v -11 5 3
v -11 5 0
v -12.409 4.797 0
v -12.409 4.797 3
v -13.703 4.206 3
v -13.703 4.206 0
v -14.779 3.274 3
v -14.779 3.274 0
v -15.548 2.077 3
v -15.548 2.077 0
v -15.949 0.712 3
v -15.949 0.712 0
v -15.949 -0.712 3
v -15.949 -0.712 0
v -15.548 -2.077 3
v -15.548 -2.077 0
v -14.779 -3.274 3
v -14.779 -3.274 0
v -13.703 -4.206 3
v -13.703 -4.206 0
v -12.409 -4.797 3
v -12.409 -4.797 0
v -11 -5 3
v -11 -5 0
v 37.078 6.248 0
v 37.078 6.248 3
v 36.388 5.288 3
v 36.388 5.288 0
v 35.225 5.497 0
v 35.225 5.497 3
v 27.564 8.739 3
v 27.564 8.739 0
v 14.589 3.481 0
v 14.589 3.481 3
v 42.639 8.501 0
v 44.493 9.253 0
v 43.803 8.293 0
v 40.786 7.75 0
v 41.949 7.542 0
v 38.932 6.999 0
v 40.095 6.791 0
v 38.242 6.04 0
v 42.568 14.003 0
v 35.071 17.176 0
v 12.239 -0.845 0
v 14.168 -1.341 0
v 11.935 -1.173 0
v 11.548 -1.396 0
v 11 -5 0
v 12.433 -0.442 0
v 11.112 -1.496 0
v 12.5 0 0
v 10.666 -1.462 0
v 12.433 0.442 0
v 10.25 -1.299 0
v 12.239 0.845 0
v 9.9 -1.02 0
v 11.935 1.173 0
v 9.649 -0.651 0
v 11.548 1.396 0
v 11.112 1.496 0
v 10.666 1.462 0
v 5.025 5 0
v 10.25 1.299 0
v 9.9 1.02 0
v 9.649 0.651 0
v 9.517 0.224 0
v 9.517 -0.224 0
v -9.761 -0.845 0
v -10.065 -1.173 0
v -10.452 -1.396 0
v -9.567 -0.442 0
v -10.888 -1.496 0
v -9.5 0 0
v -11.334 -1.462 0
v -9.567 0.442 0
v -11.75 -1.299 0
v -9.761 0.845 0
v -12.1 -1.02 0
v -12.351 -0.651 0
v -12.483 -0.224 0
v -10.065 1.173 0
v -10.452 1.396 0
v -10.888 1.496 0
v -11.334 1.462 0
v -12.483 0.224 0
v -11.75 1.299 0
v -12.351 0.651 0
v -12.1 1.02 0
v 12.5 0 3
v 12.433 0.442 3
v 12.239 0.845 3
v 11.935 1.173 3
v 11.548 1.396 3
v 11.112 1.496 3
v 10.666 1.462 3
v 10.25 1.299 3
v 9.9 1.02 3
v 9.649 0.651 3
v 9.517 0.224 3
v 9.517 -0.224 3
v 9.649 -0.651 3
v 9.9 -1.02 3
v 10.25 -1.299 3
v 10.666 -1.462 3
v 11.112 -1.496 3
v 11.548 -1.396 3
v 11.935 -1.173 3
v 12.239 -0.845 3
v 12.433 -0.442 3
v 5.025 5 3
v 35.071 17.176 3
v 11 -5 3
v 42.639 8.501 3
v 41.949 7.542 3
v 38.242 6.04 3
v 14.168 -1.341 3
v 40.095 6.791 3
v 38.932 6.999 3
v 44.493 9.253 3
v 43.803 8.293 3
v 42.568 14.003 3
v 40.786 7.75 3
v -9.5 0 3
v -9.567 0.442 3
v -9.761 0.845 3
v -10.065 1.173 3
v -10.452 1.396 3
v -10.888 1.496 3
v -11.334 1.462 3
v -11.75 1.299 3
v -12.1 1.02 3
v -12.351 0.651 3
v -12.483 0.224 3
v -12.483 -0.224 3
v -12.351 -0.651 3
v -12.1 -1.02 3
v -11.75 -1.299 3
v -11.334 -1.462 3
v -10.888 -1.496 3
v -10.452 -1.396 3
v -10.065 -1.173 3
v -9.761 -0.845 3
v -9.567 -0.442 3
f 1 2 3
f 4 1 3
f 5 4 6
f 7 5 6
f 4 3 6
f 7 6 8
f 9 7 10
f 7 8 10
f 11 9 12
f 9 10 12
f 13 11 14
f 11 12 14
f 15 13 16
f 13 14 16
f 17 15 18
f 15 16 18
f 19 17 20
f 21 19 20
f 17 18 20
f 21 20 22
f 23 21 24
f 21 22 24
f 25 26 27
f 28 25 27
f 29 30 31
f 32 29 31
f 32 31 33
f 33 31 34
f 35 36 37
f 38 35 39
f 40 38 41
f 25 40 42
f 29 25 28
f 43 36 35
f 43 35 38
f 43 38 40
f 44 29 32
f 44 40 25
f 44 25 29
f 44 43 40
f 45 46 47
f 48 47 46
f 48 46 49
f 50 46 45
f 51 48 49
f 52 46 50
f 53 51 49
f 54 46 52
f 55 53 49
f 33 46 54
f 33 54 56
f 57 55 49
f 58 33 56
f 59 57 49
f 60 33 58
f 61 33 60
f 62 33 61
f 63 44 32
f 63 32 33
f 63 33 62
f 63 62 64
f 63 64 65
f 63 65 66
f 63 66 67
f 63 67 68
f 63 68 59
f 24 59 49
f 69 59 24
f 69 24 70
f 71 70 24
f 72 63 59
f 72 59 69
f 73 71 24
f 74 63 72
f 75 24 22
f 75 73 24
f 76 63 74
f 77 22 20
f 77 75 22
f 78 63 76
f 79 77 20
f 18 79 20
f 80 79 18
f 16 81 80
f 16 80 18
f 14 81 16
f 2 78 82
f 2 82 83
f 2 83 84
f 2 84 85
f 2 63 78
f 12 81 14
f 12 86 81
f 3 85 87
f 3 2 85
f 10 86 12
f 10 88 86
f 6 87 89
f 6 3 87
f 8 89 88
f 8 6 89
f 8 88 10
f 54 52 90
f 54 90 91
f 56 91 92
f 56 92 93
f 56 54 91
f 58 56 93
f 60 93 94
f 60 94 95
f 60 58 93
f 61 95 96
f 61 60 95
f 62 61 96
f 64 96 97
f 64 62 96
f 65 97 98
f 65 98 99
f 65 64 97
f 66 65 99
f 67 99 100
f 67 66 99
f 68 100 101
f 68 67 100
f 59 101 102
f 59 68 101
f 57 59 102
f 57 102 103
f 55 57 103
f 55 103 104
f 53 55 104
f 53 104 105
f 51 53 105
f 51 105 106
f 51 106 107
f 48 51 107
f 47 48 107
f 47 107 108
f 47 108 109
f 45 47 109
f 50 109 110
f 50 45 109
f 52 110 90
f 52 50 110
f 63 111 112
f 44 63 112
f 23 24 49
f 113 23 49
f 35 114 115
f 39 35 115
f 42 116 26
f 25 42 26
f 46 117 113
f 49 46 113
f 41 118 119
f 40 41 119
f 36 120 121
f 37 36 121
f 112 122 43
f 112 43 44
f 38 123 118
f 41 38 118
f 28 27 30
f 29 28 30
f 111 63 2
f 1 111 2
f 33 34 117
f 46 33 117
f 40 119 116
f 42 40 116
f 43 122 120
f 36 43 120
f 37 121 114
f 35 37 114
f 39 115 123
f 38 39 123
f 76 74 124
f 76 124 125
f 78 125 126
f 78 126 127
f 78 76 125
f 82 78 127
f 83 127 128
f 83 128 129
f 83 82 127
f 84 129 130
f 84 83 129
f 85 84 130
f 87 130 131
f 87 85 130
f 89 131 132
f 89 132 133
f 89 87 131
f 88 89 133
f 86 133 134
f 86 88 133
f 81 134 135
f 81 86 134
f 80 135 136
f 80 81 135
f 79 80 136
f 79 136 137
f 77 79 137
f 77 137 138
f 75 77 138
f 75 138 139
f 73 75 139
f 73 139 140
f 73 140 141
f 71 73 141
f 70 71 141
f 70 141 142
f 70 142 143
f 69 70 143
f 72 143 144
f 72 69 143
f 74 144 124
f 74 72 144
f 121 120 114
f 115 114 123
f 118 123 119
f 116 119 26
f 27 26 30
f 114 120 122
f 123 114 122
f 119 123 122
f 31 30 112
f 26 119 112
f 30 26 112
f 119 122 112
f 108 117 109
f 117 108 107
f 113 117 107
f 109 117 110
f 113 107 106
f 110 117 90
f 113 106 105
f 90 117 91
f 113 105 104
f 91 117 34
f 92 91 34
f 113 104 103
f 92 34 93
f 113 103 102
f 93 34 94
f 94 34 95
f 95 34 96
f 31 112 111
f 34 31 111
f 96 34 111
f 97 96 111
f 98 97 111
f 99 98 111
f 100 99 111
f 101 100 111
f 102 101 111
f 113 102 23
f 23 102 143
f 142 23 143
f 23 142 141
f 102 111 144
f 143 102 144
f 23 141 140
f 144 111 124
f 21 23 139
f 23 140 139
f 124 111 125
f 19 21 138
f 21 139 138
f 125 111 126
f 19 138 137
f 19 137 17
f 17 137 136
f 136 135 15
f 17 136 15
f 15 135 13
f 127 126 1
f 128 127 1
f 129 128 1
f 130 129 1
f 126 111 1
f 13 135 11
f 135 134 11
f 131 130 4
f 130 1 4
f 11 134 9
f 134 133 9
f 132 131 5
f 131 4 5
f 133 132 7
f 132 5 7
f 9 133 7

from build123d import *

# Parameters (mm, degrees)
SKETCH2_R               = 1.5
BOSS_EXTRUDE1_DEPTH     = 3
BOSS_EXTRUDE2_DEPTH     = 3
CUT_EXTRUDE1_DEPTH      = 3
CUT_EXTRUDE2_DEPTH      = 1
CUT_EXTRUDE2_DEPTH_BACK = 4


with BuildPart() as part:
    # Sketch2 → Boss-Extrude1 (new body)
    with BuildSketch(Plane.XY):
        with BuildLine():
            Line((11, 5), (-11, 5))
            ThreePointArc((-11, 5), (-16, 0), (-11, -5))
            Line((-11, -5), (11, -5))
            ThreePointArc((11, -5), (16, 0), (11, 5))
        make_face()
        with Locations((-11, 0)):
            Circle(SKETCH2_R, mode=Mode.SUBTRACT)
        with Locations((11, 0)):
            Circle(SKETCH2_R, mode=Mode.SUBTRACT)
    extrude(amount=BOSS_EXTRUDE1_DEPTH)

    # Sketch3 → Boss-Extrude2 (add)
    with BuildSketch(Plane.XY.offset(3)):
        with BuildLine():
            Line((44.729340863, 8.668642725), (35.461430272, 4.9128694))
            Line((35.461430272, 4.9128694), (35.224816552, 5.496747767))
            Line((35.224816552, 5.496747767), (27.564491501, 8.738899793))
            Line((27.564491501, 8.738899793), (14.589416673, 3.480817138))
            ThreePointArc((14.589416673, 3.480817138), (12.94883482, 4.604567607), (11, 5))
            Line((11, 5), (5.025381266, 5))
            Line((5.025381266, 5), (40.405753968, 19.337714926))
            Line((40.405753968, 19.337714926), (44.729340863, 8.668642725))
        make_face()
    extrude(amount=-BOSS_EXTRUDE2_DEPTH)

    # Sketch5 → Cut-Extrude1 (cut)
    with BuildSketch(Plane.XY.offset(3)):
        Polygon((40.405753968, 19.337714926), (42.567547416, 14.003178826), (35.071217868, 17.175921479), align=None)
    extrude(amount=-CUT_EXTRUDE1_DEPTH, mode=Mode.SUBTRACT)

    # Sketch6 → Cut-Extrude2 (cut, two sides)
    with BuildSketch(Plane.XY.offset(3)) as cut_extrude2_sk:
        Polygon((40.785562907, 7.750211762), (40.095385567, 6.790756063), (41.948967686, 7.541910728), align=None)
        Polygon((38.931980789, 6.999057097), (38.241803449, 6.039601398), (40.095385567, 6.790756063), align=None)
        Polygon((37.078398671, 6.247902432), (36.388221331, 5.288446733), (38.241803449, 6.039601398), align=None)
        Polygon((36.388221331, 5.288446733), (35.224816552, 5.496747767), (35.461430272, 4.9128694), align=None)
        Polygon((42.639145025, 8.501366427), (41.948967686, 7.541910728), (43.802549804, 8.293065393), align=None)
        Polygon((44.492727144, 9.252521092), (43.802549804, 8.293065393), (44.729340863, 8.668642725), align=None)
        with BuildLine():
            ThreePointArc((11, -5), (15.604567607, -1.94883482), (14.589416673, 3.480817138))
            Line((14.589416673, 3.480817138), (14.167937437, -1.340796208))
            Line((14.167937437, -1.340796208), (11, -5))
        make_face()
    extrude(amount=CUT_EXTRUDE2_DEPTH, mode=Mode.SUBTRACT)
    extrude(cut_extrude2_sk.sketch, amount=-CUT_EXTRUDE2_DEPTH_BACK, mode=Mode.SUBTRACT)


solid = part.part
